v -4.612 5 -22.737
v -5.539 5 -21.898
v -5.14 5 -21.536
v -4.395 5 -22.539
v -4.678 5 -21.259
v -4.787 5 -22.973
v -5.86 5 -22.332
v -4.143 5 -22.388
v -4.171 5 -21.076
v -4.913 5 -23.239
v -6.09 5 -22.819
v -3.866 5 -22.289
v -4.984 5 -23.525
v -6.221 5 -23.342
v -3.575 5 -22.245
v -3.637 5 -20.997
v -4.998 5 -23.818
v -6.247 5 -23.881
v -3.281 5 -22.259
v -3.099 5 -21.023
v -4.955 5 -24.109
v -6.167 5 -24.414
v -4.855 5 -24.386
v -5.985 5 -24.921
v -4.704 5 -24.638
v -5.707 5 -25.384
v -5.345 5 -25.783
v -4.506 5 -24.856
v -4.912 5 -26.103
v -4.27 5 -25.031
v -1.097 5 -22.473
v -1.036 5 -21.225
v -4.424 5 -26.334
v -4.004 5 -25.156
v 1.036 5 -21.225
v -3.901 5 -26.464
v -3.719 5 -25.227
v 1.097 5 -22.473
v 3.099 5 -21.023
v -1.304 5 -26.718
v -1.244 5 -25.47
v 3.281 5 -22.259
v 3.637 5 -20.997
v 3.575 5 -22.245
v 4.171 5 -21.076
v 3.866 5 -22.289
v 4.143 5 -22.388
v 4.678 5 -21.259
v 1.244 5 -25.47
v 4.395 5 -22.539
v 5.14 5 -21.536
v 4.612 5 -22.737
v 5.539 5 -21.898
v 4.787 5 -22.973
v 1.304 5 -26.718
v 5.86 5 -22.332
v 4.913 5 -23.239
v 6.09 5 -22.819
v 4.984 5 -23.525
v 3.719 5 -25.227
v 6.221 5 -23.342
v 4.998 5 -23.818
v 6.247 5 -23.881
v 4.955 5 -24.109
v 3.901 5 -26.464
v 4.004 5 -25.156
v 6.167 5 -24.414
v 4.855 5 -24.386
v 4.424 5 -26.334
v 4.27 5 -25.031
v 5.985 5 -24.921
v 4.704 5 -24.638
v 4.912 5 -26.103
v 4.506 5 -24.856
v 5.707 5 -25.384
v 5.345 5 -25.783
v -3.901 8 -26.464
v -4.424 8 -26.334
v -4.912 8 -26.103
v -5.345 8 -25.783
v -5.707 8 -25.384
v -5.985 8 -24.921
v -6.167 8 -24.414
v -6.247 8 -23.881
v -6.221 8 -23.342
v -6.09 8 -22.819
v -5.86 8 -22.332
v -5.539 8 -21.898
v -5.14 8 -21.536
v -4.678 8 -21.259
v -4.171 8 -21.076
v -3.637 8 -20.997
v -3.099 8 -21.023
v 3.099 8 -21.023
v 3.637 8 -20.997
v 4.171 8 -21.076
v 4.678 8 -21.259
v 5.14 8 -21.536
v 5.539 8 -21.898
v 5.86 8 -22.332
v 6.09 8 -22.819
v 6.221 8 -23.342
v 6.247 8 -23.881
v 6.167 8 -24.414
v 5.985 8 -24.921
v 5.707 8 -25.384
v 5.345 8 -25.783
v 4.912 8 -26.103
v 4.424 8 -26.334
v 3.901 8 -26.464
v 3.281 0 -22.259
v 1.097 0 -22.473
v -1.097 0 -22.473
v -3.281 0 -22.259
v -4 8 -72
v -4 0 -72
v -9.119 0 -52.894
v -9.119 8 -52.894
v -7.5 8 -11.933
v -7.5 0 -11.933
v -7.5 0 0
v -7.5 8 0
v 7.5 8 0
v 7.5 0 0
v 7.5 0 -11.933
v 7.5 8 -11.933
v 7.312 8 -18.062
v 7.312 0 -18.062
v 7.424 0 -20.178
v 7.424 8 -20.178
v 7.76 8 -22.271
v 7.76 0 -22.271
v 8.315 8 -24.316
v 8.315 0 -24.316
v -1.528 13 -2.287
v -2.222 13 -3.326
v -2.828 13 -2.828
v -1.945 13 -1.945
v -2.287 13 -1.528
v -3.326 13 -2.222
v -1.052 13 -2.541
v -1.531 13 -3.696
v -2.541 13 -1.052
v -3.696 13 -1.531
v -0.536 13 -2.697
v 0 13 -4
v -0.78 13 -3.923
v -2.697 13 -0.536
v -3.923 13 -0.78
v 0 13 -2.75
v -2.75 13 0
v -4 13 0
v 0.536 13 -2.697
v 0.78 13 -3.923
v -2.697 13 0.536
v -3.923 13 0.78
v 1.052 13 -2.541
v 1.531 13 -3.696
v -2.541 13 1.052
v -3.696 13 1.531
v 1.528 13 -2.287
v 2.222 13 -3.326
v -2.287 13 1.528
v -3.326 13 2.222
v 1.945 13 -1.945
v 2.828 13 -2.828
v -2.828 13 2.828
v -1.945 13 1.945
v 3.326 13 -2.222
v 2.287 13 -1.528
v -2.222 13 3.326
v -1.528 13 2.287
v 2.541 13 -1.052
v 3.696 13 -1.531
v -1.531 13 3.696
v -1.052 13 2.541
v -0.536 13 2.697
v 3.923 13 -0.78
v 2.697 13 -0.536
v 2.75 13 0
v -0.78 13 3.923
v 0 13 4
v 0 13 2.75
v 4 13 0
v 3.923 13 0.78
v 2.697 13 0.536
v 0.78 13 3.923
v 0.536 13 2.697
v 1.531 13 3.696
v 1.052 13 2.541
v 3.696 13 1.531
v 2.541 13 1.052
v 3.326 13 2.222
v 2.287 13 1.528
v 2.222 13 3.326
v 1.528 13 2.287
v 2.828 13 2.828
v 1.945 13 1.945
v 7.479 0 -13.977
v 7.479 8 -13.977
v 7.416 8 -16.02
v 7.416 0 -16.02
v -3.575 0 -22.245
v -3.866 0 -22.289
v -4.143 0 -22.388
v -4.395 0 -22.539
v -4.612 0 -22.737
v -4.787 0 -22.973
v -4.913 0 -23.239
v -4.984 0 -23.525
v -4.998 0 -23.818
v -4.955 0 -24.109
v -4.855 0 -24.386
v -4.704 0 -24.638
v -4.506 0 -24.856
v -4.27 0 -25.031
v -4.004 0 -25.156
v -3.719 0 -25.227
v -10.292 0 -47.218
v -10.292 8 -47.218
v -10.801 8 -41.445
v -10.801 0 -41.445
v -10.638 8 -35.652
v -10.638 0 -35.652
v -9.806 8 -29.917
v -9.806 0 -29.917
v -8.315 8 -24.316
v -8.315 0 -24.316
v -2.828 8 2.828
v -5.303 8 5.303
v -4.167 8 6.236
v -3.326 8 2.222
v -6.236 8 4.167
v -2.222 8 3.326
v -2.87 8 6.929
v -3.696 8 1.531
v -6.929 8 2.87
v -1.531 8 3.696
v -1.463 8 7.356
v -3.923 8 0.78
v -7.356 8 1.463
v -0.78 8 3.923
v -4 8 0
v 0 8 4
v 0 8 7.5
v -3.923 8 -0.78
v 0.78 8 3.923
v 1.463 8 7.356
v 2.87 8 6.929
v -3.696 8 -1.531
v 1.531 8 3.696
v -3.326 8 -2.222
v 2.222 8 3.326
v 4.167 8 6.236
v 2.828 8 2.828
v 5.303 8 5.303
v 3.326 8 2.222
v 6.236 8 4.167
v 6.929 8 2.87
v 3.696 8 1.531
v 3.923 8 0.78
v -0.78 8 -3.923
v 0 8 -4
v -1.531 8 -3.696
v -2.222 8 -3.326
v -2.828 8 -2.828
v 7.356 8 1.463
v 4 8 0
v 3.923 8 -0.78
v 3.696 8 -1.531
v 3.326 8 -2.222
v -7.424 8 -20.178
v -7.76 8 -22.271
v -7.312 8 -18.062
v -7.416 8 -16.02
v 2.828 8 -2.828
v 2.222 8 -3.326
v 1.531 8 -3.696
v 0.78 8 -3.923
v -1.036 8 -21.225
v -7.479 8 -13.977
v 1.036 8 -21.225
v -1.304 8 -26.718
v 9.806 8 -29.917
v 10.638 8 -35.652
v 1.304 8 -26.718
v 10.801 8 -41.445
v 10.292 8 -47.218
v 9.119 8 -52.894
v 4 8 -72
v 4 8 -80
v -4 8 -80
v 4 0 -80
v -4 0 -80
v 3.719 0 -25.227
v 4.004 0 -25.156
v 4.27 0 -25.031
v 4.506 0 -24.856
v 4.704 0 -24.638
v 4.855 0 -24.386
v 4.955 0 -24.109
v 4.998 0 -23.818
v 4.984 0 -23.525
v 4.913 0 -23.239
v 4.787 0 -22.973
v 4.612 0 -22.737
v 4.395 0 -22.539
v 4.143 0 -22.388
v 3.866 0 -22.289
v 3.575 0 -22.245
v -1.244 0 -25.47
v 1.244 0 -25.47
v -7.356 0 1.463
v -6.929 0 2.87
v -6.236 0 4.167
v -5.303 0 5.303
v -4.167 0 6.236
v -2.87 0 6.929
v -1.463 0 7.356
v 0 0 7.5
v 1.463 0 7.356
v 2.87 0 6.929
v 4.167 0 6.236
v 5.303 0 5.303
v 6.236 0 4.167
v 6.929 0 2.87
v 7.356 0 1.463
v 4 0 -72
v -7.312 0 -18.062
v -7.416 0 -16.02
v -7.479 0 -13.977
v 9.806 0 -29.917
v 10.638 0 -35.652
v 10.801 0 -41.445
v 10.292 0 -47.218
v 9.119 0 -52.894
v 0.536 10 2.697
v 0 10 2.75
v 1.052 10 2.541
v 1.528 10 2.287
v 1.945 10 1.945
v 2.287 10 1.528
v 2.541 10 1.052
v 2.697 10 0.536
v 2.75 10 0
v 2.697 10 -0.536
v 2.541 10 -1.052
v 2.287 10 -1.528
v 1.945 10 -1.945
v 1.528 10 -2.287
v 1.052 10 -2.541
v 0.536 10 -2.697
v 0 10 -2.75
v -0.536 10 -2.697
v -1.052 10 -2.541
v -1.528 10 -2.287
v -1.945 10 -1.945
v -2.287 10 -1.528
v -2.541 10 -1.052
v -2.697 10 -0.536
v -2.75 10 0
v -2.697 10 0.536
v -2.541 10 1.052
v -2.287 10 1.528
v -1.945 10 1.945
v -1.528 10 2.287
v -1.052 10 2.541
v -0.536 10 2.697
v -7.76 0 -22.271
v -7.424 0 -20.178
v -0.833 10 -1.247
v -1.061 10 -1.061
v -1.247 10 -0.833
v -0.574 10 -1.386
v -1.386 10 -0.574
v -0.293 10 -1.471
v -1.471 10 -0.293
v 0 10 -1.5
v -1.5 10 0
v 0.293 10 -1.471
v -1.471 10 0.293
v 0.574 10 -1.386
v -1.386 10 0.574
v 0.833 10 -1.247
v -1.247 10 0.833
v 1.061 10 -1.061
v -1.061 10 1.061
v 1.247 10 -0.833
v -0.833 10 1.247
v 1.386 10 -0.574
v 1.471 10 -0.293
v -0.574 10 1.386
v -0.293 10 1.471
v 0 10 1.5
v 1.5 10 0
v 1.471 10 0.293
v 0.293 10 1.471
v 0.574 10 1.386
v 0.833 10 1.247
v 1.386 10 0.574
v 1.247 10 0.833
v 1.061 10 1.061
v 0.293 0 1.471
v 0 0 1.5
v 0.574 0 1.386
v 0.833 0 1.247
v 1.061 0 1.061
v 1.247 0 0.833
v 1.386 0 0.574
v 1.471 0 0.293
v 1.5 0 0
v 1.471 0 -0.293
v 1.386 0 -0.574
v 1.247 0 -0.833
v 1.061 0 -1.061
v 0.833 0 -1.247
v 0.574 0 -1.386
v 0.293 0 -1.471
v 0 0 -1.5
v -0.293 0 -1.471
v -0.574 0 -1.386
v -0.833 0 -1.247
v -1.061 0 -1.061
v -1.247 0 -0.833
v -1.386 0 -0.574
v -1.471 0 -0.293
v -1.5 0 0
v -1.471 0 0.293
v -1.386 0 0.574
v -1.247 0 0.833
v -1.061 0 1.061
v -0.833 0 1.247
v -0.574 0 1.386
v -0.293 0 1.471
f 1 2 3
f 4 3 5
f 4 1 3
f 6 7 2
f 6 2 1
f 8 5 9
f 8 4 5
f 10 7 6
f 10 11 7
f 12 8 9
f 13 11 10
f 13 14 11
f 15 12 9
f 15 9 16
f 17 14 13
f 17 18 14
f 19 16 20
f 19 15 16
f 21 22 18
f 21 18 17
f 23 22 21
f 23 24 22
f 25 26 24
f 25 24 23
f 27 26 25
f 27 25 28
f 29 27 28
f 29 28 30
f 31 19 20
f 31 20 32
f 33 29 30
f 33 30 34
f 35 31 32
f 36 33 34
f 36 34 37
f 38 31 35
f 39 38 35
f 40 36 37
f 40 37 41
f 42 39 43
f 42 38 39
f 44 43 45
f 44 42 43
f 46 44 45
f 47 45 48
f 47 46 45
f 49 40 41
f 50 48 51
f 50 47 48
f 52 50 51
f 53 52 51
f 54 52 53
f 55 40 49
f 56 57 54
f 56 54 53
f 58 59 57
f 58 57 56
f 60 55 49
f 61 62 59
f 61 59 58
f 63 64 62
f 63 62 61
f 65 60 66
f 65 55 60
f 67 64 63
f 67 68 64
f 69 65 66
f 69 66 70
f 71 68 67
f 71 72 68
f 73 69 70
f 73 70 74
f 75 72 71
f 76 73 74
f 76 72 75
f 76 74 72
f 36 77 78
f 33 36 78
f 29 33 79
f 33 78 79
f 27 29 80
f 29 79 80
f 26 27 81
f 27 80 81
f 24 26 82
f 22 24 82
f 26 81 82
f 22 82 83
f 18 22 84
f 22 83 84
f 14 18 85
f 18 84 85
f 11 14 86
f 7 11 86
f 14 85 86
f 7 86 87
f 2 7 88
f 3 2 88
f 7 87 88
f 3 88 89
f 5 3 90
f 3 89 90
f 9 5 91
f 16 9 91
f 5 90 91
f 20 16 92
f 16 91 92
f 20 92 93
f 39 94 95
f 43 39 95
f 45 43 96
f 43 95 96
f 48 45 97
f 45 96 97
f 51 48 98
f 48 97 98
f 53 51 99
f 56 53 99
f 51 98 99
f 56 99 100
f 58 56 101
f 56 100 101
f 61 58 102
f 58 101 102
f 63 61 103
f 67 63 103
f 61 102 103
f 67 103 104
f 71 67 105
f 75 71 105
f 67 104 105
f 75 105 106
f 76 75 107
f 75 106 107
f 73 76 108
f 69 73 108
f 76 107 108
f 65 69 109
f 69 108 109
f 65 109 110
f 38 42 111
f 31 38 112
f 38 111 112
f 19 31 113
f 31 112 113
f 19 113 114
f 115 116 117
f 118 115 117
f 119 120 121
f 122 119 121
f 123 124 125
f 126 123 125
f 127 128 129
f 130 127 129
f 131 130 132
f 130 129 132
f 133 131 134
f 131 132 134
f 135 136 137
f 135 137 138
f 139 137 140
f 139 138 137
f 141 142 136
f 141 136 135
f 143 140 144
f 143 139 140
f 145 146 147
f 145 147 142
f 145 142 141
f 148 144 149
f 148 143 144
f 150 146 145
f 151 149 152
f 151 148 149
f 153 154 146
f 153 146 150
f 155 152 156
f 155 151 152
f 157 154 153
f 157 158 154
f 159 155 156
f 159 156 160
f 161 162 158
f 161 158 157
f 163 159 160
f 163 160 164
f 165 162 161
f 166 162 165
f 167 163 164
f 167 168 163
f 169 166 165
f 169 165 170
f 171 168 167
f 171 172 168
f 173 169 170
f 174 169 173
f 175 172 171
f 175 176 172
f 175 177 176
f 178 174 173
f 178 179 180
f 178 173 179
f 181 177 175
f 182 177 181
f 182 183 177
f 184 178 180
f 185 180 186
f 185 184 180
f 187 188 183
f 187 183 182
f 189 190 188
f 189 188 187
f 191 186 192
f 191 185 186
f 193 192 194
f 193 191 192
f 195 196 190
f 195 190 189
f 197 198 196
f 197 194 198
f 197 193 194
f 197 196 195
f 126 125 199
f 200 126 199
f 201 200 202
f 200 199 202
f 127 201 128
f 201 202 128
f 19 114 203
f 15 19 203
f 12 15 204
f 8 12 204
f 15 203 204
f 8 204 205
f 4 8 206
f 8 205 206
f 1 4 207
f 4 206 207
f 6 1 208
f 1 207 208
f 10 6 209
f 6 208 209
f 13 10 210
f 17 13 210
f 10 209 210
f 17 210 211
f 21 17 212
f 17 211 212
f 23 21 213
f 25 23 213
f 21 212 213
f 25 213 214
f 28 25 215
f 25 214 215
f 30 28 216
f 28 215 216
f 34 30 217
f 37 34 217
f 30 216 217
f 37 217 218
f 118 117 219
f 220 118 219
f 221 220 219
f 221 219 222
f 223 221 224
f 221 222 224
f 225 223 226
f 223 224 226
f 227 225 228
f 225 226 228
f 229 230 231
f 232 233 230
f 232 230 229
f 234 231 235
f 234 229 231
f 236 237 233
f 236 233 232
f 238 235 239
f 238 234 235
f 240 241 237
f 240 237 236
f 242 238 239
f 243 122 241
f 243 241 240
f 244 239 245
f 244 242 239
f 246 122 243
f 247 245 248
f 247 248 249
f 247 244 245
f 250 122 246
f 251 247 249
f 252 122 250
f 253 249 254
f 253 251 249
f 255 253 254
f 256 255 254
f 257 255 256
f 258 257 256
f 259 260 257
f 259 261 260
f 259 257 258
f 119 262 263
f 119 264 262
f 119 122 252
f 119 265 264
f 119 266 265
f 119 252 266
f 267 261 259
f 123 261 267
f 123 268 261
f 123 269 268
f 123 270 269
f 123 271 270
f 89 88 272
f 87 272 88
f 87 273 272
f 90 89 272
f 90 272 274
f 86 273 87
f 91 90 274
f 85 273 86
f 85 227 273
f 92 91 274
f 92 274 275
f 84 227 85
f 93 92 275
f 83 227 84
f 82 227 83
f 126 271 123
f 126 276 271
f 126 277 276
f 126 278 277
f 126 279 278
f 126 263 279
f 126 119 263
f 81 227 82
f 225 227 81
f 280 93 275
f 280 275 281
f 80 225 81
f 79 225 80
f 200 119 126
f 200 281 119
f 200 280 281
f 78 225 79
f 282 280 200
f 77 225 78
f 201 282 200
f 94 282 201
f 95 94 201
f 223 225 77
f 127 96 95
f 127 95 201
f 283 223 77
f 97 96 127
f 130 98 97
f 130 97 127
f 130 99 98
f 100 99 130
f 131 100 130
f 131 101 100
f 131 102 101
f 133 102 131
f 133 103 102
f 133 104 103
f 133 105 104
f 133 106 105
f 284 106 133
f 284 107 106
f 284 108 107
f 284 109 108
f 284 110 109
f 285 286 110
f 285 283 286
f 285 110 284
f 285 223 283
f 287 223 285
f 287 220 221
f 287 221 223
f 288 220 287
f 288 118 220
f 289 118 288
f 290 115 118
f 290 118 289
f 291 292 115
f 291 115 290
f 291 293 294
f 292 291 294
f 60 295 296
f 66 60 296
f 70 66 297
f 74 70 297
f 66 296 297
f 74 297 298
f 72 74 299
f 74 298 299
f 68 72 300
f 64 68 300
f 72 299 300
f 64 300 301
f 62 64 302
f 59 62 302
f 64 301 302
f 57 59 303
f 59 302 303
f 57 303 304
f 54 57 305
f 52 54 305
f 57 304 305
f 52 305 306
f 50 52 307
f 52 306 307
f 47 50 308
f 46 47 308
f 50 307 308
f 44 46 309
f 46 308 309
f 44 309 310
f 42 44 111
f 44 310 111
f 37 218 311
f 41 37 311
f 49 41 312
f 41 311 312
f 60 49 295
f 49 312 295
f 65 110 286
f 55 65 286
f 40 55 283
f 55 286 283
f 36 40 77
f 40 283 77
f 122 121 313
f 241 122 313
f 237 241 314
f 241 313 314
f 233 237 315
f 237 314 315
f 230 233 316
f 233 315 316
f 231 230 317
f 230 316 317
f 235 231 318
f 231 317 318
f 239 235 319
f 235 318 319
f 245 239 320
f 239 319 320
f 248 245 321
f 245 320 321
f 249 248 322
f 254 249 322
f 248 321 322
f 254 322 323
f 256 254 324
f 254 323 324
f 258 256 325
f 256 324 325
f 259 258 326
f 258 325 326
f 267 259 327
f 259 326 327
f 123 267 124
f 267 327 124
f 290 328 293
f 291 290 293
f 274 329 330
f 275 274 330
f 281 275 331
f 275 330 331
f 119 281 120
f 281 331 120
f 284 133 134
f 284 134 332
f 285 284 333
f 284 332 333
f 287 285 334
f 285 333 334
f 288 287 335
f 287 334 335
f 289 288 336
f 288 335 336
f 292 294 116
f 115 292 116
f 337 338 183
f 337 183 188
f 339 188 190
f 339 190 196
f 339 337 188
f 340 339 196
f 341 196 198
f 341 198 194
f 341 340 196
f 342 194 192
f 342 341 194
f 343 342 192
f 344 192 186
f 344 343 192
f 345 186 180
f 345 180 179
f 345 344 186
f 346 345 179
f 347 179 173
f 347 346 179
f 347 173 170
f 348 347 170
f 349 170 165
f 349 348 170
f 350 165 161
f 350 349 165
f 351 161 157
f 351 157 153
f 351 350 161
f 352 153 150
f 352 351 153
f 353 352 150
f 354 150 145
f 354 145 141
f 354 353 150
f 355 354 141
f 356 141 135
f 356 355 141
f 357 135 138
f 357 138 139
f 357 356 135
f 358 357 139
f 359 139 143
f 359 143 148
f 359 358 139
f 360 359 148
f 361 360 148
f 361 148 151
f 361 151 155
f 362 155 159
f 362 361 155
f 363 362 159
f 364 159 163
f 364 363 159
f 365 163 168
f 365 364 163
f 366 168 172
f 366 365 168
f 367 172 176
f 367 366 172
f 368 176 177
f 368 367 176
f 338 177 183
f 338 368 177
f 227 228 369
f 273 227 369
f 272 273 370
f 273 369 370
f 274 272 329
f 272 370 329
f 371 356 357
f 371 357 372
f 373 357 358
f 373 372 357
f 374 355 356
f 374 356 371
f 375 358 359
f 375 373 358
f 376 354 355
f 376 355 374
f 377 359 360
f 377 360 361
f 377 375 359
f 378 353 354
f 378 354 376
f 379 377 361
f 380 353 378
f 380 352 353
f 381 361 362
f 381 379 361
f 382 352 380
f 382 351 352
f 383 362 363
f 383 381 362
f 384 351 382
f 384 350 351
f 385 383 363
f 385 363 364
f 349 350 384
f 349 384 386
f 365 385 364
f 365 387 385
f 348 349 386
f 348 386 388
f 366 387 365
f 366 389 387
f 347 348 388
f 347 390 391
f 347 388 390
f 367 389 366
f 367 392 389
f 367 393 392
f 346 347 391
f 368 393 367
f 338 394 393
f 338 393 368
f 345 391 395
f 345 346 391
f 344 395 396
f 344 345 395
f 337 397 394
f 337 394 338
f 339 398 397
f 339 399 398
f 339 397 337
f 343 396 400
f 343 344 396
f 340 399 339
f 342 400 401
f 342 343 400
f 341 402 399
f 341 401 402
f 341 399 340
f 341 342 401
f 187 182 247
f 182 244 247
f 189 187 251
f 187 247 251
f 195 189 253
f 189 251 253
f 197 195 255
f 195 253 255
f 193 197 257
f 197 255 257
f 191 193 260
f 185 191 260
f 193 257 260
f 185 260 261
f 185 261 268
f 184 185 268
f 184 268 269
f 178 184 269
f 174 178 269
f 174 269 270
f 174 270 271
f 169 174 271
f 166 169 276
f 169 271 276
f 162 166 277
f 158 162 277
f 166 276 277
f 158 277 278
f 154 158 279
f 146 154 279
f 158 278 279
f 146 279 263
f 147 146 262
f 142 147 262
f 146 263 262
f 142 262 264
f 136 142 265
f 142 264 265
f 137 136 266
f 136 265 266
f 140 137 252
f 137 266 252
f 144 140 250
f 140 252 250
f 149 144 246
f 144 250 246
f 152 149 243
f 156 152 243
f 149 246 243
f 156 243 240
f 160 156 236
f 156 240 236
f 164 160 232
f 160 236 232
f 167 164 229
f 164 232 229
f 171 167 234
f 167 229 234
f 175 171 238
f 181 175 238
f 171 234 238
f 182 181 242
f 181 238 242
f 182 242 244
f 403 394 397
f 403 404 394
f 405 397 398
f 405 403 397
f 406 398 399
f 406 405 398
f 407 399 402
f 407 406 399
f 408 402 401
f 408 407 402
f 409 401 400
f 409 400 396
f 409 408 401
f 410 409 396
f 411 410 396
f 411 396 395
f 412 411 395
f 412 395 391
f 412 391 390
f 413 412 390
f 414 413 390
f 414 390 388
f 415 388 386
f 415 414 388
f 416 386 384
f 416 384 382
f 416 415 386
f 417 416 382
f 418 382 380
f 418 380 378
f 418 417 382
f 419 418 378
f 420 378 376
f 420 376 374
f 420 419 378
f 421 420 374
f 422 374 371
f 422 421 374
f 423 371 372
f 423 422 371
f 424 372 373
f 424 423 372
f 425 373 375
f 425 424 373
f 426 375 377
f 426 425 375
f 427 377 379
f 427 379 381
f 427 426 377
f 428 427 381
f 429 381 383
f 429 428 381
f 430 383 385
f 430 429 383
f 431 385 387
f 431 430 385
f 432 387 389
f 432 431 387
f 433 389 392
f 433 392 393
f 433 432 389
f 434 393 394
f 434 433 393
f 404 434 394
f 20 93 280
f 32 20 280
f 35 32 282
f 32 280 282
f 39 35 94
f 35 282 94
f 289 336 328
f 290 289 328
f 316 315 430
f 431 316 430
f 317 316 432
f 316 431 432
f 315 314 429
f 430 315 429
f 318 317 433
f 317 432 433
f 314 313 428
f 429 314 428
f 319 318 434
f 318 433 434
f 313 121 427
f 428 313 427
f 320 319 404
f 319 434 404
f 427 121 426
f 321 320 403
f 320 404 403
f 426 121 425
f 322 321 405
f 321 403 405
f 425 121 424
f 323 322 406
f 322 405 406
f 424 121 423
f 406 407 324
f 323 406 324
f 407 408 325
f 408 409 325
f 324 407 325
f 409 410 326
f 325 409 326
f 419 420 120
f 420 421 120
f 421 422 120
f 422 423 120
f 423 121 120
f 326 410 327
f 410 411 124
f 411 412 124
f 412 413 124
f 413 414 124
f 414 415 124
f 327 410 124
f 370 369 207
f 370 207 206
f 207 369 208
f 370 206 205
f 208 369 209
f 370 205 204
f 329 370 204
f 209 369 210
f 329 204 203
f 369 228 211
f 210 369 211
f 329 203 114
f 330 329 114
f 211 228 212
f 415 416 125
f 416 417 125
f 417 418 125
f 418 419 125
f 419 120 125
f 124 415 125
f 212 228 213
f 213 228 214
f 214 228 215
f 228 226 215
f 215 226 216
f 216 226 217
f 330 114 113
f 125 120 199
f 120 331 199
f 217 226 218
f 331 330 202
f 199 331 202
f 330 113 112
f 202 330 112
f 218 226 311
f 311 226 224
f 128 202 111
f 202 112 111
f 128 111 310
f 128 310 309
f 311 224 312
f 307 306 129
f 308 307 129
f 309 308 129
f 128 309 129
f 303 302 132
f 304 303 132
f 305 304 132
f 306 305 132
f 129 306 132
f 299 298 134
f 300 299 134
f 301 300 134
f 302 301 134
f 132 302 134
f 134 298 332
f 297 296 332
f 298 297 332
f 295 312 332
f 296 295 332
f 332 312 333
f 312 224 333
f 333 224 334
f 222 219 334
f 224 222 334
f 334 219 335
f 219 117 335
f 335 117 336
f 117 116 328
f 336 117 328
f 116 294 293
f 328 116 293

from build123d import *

# Parameters (mm, degrees)
SKETCH1_R           = 1.5
BOSS_EXTRUDE1_DEPTH = 8
SKETCH2_R           = 4
SKETCH2_R_2         = 1.5
BOSS_EXTRUDE2_DEPTH = 2
SKETCH3_R           = 4
SKETCH3_R_2         = 2.75
BOSS_EXTRUDE3_DEPTH = 3
CUT_EXTRUDE1_DEPTH  = 3


with BuildPart() as part:
    # Sketch1 → Boss-Extrude1 (new body)
    with BuildSketch(Plane(origin=(0, 0, 0), x_dir=(1, 0, 0), z_dir=(0, 1, 0))):
        with BuildLine():
            Line((-7.5, 11.932713059), (-7.5, 0))
            ThreePointArc((-7.5, 0), (0, -7.5), (7.5, 0))
            Line((7.5, 0), (7.5, 11.932713059))
            ThreePointArc((7.5, 11.932713059), (7.452991921, 14.998558127), (7.31201188, 18.061520806))
            ThreePointArc((7.31201188, 18.061520806), (7.564401673, 21.22883688), (8.315200992, 24.31621313))
            ThreePointArc((8.315200992, 24.31621313), (10.803384698, 38.546346738), (9.119465085, 52.893896195))
            Line((9.119465085, 52.893896195), (4, 72))
            Line((4, 72), (4, 80))
            Line((4, 80), (-4, 80))
            Line((-4, 80), (-4, 72))
            Line((-4, 72), (-9.119465085, 52.893896195))
            ThreePointArc((-9.119465085, 52.893896195), (-10.803384698, 38.546346738), (-8.315200992, 24.31621313))
            ThreePointArc((-8.315200992, 24.31621313), (-7.564401673, 21.22883688), (-7.31201188, 18.061520806))
            ThreePointArc((-7.31201188, 18.061520806), (-7.452991921, 14.998558127), (-7.5, 11.932713059))
        make_face()
        with Locations(Location((0, 0, 0), (0, 0, 270))):
            Circle(SKETCH1_R, mode=Mode.SUBTRACT)
        with BuildLine():
            ThreePointArc((-3.28125, 22.259456382), (-4.983963759, 23.524670141), (-3.71875, 25.2273839))
            ThreePointArc((-3.71875, 25.2273839), (0, 25.5), (3.71875, 25.2273839))
            ThreePointArc((3.71875, 25.2273839), (4.983963759, 23.524670141), (3.28125, 22.259456382))
            ThreePointArc((3.28125, 22.259456382), (0, 22.5), (-3.28125, 22.259456382))
        make_face(mode=Mode.SUBTRACT)
    extrude(amount=BOSS_EXTRUDE1_DEPTH)

    # Sketch2 → Boss-Extrude2 (add)
    with BuildSketch(Plane(origin=(0, 8, 0), x_dir=(1, 0, 0), z_dir=(0, 1, 0))):
        with Locations(Location((0, 0, 0), (0, 0, 270))):
            Circle(SKETCH2_R)
        with Locations(Location((0, 0, 0), (0, 0, 270))):
            Circle(SKETCH2_R_2, mode=Mode.SUBTRACT)
    extrude(amount=BOSS_EXTRUDE2_DEPTH)

    # Sketch3 → Boss-Extrude3 (add)
    with BuildSketch(Plane(origin=(0, 10, 0), x_dir=(1, 0, 0), z_dir=(0, 1, 0))):
        with Locations(Location((0, 0, 0), (0, 0, 270))):
            Circle(SKETCH3_R)
        with Locations(Location((0, 0, 0), (0, 0, 270))):
            Circle(SKETCH3_R_2, mode=Mode.SUBTRACT)
    extrude(amount=BOSS_EXTRUDE3_DEPTH)

    # Sketch4 → Cut-Extrude1 (cut)
    with BuildSketch(Plane(origin=(0, 8, 0), x_dir=(1, 0, 0), z_dir=(0, 1, 0))):
        with BuildLine():
            ThreePointArc((3.098958333, 21.022819917), (6.220600225, 23.342378475), (3.901041667, 26.464020366))
            ThreePointArc((3.901041667, 26.464020366), (0, 26.75), (-3.901041667, 26.464020366))
            ThreePointArc((-3.901041667, 26.464020366), (-6.220600225, 23.342378475), (-3.098958333, 21.022819917))
            ThreePointArc((-3.098958333, 21.022819917), (0, 21.25), (3.098958333, 21.022819917))
        make_face()
    extrude(amount=-CUT_EXTRUDE1_DEPTH, mode=Mode.SUBTRACT)


solid = part.part
